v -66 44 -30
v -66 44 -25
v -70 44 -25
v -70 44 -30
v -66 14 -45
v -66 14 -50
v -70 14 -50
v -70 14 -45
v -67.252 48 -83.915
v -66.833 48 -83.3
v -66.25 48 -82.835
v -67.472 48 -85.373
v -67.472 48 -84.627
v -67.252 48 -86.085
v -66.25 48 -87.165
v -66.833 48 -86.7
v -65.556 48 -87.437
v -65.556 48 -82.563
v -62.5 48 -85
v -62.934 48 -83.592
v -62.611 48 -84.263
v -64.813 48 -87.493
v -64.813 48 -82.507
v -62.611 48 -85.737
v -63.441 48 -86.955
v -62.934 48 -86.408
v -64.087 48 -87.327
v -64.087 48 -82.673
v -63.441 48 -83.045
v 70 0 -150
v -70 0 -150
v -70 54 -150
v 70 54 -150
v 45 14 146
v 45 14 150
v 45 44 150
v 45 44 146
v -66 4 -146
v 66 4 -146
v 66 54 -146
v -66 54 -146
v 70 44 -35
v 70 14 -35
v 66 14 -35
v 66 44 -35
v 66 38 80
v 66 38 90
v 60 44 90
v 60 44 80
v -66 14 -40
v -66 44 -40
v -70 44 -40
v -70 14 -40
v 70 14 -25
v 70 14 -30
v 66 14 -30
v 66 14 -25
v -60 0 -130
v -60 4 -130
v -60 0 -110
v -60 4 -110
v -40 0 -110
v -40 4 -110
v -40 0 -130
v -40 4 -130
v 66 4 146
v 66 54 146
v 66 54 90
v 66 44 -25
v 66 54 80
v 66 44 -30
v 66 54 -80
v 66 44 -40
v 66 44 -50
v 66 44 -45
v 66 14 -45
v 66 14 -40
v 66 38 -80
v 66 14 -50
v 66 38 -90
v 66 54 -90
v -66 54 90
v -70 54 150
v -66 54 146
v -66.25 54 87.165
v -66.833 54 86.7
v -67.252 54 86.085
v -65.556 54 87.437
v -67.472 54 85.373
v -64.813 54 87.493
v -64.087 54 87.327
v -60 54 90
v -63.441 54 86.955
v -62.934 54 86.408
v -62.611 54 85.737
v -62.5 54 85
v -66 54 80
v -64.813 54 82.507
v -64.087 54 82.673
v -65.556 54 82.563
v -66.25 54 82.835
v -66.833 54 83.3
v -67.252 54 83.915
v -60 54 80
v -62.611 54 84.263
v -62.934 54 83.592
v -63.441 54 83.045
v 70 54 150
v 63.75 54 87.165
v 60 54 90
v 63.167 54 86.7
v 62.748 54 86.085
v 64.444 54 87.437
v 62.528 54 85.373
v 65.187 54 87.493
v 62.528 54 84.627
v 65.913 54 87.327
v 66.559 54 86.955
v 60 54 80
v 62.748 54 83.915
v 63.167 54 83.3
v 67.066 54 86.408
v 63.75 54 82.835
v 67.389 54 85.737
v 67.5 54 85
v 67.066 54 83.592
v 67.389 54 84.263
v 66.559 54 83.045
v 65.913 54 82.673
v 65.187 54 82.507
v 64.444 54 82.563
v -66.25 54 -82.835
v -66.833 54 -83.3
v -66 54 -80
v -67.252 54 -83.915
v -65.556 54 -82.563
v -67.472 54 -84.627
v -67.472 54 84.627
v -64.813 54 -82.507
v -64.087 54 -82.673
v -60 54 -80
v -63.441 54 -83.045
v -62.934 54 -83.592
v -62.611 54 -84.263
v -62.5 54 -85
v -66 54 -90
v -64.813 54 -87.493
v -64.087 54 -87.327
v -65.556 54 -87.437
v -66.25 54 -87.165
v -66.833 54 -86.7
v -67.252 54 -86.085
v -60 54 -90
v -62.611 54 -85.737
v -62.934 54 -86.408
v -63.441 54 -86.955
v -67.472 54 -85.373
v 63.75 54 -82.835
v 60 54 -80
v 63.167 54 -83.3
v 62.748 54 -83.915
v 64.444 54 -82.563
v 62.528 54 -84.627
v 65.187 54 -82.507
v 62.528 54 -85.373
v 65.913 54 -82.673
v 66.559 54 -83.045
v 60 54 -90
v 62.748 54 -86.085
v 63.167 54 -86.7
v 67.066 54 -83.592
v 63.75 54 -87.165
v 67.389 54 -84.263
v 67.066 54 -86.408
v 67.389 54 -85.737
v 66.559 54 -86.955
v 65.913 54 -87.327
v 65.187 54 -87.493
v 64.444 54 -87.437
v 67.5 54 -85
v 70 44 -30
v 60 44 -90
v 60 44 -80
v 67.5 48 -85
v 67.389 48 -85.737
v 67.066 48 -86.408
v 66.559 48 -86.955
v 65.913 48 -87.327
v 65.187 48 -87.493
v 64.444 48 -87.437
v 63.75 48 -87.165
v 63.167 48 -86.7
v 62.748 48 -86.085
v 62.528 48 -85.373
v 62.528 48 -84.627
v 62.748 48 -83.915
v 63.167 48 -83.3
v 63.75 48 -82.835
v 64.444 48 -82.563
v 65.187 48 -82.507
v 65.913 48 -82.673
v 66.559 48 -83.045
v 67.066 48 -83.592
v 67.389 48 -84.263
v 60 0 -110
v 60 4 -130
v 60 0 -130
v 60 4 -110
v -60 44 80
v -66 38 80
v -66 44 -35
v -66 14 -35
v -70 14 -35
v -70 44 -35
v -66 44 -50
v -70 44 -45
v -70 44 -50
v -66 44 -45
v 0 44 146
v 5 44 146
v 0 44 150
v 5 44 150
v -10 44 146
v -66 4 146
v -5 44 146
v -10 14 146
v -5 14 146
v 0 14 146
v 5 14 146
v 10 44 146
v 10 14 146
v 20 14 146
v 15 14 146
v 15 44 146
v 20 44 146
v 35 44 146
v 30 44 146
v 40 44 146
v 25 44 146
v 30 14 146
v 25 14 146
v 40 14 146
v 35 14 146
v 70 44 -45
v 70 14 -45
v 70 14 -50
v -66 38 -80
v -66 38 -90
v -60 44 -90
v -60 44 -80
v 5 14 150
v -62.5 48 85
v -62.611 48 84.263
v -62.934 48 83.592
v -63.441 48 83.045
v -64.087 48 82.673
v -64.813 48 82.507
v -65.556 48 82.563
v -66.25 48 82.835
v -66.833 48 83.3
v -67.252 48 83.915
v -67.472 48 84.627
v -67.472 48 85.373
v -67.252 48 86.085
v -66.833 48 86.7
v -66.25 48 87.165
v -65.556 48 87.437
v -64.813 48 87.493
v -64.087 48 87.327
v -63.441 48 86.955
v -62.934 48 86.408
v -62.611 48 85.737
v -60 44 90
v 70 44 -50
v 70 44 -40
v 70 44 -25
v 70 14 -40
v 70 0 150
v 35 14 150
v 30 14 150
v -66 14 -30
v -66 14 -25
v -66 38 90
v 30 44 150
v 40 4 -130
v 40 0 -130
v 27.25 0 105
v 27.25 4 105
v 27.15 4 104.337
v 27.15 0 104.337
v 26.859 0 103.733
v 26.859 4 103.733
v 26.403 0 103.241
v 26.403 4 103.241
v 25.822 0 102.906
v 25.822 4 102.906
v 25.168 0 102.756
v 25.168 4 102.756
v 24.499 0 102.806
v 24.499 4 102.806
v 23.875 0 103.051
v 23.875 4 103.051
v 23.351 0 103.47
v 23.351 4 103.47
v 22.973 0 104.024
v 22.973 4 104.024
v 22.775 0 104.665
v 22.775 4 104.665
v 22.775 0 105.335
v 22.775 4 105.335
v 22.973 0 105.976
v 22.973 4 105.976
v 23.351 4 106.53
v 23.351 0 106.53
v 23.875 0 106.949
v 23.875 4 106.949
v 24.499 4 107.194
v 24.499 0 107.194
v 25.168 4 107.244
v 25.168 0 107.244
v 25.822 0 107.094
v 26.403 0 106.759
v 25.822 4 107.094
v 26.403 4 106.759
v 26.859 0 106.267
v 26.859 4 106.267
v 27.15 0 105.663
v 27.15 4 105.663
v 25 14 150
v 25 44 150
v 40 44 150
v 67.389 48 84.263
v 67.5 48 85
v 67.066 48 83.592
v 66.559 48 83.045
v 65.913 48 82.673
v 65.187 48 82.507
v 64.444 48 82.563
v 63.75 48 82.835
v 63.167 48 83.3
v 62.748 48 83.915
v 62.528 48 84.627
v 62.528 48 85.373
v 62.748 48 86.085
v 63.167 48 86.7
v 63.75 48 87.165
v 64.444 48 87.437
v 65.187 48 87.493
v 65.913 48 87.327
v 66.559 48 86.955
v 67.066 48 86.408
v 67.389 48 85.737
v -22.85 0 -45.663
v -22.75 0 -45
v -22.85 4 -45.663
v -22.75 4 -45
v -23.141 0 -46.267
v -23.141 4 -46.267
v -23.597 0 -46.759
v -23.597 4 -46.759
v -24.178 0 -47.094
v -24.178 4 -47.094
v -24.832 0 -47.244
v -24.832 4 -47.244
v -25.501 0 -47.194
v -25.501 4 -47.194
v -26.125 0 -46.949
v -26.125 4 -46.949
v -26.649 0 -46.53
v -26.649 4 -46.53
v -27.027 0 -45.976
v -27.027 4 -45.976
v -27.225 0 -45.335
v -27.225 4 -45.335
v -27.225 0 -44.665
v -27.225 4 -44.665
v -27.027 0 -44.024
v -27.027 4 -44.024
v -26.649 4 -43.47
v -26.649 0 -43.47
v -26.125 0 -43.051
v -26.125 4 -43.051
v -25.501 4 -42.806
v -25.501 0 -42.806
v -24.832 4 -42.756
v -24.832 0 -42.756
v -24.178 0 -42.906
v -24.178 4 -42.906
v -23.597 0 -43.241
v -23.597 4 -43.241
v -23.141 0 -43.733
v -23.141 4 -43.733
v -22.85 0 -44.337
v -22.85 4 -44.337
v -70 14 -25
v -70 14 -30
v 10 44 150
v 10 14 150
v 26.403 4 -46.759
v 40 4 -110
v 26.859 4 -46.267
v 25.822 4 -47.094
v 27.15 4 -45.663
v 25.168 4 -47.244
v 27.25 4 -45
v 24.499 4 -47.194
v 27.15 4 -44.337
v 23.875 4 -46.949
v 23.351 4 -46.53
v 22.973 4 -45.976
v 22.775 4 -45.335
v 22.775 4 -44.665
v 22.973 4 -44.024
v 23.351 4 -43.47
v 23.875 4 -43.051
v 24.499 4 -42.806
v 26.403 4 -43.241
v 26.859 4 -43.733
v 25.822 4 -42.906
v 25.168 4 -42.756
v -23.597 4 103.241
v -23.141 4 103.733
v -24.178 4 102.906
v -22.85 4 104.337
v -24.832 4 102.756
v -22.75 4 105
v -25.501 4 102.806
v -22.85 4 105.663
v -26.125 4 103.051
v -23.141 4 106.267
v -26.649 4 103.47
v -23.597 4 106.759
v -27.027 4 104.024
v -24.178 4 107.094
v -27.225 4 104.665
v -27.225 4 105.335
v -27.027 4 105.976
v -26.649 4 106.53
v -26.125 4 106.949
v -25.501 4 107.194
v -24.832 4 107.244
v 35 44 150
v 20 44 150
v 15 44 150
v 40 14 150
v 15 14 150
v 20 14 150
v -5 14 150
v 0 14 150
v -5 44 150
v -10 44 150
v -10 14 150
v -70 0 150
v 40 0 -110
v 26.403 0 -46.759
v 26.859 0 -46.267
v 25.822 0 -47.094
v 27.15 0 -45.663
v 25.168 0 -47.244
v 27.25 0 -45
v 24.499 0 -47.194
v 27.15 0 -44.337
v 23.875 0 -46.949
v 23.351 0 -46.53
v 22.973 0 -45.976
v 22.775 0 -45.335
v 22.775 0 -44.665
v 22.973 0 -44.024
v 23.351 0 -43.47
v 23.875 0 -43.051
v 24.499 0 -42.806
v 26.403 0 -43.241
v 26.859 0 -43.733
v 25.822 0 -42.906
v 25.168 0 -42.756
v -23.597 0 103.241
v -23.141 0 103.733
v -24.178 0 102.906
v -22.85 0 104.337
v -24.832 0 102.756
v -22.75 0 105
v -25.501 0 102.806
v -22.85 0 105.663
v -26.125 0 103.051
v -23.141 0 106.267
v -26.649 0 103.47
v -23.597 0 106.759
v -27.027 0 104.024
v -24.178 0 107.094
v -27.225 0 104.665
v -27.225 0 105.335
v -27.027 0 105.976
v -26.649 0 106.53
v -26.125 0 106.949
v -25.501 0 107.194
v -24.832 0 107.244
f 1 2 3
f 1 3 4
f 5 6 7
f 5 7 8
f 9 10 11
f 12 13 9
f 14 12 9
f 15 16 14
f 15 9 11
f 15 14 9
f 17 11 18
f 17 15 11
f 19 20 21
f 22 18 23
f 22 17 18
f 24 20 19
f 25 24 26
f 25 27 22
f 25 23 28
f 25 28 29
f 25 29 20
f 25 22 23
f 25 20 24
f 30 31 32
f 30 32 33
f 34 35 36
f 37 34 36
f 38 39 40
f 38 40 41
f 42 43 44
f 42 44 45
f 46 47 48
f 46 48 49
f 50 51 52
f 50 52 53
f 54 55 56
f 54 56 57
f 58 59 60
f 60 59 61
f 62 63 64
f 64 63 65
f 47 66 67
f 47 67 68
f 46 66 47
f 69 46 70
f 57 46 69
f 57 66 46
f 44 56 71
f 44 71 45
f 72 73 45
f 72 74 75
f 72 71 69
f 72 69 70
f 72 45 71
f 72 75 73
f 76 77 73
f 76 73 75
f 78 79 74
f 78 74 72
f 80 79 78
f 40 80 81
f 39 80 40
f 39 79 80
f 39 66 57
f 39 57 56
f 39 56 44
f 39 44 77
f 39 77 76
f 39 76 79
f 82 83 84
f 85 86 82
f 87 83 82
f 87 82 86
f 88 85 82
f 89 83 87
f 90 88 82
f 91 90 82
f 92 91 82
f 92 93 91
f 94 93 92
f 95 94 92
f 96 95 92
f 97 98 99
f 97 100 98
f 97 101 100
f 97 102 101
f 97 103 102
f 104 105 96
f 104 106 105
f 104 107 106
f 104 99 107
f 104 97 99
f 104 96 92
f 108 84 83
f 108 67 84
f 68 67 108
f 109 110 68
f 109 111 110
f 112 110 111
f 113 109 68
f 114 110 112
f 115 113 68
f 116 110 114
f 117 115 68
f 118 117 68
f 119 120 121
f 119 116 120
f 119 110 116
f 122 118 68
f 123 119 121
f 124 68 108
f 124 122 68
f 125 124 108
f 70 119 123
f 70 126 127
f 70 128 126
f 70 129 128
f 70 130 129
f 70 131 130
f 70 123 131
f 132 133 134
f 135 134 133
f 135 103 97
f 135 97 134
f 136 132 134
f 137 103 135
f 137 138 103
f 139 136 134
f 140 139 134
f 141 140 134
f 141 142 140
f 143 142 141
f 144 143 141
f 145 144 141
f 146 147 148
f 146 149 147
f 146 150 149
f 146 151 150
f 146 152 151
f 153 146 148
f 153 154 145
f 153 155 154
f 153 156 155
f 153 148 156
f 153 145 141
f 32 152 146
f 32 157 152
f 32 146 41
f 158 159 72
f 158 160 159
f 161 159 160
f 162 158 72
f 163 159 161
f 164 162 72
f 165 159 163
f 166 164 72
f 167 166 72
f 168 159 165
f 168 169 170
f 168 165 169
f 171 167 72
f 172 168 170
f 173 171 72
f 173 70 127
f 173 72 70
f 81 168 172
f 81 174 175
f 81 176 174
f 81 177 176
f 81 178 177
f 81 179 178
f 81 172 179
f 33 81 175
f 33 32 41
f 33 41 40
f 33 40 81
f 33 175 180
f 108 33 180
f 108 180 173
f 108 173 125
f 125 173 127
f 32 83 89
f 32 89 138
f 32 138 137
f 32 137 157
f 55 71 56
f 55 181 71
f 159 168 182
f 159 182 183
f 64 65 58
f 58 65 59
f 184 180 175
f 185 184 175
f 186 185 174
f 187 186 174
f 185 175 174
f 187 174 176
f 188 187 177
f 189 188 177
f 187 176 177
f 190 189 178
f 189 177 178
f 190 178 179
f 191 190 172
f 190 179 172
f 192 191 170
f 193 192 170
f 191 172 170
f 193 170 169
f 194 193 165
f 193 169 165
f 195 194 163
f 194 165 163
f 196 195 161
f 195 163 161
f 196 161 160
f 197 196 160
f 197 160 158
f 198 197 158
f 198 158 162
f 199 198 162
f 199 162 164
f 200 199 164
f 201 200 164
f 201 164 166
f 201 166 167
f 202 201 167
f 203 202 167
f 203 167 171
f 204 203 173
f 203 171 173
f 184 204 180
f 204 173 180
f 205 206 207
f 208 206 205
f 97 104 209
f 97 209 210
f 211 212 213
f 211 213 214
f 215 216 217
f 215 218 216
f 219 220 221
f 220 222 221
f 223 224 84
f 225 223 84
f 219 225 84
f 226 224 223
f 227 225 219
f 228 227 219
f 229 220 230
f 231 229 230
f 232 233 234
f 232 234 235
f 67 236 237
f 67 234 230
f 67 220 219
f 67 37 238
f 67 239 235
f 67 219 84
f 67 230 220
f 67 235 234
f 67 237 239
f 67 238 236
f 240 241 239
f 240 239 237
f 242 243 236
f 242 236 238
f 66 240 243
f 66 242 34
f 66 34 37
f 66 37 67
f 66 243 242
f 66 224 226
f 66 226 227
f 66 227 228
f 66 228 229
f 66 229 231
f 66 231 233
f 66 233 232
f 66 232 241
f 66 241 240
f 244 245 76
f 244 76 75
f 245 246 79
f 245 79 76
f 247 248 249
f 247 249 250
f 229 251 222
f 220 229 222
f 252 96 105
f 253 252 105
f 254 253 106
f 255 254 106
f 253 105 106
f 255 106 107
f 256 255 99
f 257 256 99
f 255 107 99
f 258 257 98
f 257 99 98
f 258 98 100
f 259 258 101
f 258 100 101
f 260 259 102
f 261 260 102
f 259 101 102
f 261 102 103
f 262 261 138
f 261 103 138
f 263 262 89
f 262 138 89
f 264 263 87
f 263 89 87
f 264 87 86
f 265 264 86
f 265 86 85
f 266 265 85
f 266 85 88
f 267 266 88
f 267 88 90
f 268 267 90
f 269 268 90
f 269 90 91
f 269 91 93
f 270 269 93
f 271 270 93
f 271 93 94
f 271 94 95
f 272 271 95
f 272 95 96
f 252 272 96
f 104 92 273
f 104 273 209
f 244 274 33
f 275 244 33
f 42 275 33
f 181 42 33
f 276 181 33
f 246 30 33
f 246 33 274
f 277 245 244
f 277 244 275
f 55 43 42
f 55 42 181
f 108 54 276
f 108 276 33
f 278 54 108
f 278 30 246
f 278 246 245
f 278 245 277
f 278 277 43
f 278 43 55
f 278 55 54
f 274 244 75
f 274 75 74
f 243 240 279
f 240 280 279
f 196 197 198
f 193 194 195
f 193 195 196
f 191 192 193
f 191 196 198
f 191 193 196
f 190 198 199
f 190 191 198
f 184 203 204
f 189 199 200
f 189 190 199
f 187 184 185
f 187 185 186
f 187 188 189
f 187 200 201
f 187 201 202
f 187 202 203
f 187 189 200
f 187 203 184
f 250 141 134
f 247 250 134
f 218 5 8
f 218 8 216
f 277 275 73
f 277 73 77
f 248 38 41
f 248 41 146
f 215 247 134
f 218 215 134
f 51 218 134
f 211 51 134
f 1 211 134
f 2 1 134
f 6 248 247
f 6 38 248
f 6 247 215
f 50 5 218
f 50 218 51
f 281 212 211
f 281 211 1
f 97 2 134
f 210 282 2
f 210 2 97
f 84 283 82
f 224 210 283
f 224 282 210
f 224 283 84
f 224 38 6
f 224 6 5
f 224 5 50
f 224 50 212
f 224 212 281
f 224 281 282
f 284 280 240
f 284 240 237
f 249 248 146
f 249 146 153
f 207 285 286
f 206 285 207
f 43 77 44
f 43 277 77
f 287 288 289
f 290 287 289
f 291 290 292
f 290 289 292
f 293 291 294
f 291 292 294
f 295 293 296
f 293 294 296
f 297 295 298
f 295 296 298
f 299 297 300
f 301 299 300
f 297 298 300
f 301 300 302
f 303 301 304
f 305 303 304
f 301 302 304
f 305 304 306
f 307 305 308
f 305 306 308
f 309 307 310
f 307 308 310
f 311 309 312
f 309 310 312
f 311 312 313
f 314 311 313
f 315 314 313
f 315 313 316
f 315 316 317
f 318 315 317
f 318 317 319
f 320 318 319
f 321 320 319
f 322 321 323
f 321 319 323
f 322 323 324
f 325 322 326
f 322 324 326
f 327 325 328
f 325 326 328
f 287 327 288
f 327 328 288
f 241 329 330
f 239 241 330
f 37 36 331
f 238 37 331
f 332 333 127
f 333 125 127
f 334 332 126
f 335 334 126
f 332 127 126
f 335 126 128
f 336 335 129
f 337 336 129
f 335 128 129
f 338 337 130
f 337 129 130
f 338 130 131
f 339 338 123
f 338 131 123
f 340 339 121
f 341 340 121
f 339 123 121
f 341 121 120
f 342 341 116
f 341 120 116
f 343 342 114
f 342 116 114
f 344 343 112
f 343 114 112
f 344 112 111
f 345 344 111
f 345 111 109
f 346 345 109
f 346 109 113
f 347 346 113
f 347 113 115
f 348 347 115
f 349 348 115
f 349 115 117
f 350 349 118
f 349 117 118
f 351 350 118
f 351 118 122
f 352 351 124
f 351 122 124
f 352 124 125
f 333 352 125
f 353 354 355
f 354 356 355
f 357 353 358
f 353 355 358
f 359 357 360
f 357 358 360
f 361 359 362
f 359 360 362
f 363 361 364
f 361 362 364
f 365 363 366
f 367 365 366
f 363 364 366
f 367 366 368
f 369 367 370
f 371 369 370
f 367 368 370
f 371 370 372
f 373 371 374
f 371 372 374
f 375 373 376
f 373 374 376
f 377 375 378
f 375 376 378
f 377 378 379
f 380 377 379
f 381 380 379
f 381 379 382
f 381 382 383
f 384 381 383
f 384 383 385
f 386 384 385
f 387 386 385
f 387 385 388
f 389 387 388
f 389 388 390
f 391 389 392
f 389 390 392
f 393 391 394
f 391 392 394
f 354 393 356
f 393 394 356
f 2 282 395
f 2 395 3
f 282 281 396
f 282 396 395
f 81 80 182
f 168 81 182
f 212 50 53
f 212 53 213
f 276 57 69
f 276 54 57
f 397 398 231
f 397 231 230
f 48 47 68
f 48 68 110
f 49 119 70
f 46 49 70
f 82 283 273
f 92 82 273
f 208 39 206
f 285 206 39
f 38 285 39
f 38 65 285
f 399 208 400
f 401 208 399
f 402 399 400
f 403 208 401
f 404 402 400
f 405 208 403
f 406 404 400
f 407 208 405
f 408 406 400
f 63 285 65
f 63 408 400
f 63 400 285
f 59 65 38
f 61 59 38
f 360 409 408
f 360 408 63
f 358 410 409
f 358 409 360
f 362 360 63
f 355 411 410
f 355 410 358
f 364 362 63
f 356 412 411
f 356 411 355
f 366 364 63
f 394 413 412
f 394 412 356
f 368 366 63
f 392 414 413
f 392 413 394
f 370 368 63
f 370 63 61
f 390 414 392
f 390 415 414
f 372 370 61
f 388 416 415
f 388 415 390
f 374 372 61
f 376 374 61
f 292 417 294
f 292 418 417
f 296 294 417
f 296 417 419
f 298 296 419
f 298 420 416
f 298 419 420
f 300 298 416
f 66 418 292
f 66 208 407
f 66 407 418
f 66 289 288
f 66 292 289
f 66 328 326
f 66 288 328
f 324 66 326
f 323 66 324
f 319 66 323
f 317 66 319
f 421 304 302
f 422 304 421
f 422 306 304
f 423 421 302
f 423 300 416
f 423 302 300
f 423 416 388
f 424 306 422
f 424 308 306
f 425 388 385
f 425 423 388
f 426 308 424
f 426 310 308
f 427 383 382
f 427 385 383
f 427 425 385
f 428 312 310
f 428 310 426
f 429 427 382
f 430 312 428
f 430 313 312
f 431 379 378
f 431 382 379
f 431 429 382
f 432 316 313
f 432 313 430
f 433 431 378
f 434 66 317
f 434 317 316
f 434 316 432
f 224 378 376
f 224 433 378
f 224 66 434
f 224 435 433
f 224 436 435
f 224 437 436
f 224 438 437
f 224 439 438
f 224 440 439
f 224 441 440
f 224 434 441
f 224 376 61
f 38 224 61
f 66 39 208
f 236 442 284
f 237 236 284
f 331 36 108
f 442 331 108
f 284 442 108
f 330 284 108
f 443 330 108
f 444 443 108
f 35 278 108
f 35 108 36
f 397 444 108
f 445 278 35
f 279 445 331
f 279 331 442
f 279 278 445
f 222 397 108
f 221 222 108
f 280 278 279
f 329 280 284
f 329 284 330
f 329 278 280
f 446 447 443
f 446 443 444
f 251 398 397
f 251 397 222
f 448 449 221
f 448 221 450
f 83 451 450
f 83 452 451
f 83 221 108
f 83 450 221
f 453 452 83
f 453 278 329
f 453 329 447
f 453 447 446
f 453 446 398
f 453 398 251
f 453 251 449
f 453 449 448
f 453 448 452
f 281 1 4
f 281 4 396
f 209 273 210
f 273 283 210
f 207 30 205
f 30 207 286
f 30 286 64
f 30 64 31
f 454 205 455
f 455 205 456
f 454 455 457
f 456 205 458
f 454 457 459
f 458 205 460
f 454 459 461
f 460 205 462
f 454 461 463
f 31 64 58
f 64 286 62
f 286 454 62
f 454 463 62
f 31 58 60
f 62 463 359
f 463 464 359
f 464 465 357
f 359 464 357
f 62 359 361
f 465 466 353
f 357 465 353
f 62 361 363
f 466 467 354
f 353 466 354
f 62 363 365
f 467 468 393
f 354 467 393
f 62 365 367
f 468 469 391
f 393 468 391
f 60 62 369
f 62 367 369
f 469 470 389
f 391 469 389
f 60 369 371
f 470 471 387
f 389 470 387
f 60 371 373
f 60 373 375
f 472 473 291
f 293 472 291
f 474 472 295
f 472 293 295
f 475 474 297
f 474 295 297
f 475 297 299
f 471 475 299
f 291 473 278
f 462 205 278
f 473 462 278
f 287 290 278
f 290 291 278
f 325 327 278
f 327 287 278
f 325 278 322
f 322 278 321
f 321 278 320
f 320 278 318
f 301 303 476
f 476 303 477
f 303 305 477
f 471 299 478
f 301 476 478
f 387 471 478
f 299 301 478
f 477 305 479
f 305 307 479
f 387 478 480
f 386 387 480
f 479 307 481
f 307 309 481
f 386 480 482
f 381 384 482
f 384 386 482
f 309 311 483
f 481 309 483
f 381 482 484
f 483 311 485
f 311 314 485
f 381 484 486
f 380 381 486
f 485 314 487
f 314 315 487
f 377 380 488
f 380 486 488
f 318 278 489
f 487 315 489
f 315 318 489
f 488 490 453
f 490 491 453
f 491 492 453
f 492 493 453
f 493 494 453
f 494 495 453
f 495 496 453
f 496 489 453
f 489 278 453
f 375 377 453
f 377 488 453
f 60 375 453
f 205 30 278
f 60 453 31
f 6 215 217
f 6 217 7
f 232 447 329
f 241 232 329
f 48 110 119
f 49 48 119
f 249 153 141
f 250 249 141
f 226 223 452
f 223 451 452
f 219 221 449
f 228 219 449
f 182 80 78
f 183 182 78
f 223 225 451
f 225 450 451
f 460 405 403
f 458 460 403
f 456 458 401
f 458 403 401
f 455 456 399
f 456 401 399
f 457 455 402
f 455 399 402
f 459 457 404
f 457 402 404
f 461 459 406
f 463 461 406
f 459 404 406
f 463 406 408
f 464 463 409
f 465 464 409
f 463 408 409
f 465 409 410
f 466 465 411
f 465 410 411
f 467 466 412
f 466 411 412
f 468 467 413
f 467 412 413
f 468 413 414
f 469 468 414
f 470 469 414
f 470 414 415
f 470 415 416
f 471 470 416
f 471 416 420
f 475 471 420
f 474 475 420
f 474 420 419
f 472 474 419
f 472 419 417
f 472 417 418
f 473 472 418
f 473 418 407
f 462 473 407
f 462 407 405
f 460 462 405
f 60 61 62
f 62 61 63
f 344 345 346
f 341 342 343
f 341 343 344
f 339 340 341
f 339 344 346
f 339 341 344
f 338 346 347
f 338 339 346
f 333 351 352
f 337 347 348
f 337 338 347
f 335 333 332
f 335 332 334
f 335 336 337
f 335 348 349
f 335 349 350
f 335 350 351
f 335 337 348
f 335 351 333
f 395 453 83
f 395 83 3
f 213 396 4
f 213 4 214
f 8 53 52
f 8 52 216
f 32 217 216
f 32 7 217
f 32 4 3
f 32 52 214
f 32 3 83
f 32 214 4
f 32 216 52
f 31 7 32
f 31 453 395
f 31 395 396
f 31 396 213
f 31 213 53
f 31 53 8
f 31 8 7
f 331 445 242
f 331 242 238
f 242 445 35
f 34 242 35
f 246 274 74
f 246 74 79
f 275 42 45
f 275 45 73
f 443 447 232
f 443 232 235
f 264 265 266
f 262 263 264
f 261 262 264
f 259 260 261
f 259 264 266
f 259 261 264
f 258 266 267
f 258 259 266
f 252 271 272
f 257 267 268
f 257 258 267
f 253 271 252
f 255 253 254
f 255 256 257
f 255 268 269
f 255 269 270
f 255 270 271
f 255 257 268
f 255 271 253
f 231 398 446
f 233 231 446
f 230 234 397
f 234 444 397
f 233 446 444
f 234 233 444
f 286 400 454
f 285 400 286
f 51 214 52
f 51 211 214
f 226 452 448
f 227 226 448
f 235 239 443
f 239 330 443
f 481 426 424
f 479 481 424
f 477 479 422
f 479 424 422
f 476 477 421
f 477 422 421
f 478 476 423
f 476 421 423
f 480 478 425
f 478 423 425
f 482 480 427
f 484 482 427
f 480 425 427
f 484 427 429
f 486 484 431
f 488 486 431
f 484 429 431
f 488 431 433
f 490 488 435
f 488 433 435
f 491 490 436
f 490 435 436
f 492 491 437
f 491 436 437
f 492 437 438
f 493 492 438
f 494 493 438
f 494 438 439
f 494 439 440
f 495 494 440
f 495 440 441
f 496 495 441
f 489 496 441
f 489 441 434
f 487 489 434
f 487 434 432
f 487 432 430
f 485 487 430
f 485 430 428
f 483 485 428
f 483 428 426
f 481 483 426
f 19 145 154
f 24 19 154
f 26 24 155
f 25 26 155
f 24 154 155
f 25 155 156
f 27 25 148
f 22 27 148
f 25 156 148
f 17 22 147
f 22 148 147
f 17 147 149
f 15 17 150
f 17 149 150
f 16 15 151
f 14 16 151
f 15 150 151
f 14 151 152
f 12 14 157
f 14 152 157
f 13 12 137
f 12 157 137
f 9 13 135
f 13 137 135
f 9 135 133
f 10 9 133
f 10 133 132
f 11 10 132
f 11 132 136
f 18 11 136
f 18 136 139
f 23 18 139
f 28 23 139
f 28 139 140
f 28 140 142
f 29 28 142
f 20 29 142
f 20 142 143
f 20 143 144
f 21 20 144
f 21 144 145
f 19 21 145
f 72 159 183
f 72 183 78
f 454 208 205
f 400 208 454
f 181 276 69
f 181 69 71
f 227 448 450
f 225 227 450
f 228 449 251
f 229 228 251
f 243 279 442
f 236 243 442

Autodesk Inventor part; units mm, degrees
ref_plane "YZ Plane" through (0, 0, 0) normal (1, 0, 0) x (0, 1, 0)
ref_plane "XZ Plane" through (0, 0, 0) normal (0, 1, 0) x (-1, 0, 0)
ref_plane "XY Plane" through (0, 0, 0) normal (0, 0, 1) x (1, 0, 0)
sketch "Sketch1" plane through (0, 0, 0) normal (0, 1, 0) x (-1, 0, 0)
  line L0 (70, -150) -> (-70, -150)
  line L1 (-70, -150) -> (-70, 150)
  line L2 (-70, 150) -> (70, 150)
  line L3 (70, 150) -> (70, -150)
  line L4 (0, -150) -> (0, 150) construction
  line L5 (70, 0) -> (-70, 0) construction
  point P0 (0, 0)
  point P1 (0, 0)
  dimension "d0" = 140
  dimension "d1" = 300
extrude "Extrusion1" add sketch "Sketch1" along normal blind 4
sketch "Sketch2" plane through (0, 4, 0) normal (0, 1, 0) x (1, 0, 0)
  line L0 (-70, -150) -> (70, -150) projected
  line L1 (70, -150) -> (70, 150) projected
  line L2 (-70, -150) -> (70, -150)
  line L3 (70, -150) -> (70, 150)
  line L4 (70, 150) -> (-70, 150)
  line L5 (-70, 150) -> (-70, -150)
  line L6 (-66, -146) -> (66, -146)
  line L7 (66, -146) -> (66, 146)
  line L8 (66, 146) -> (-66, 146)
  line L9 (-66, 146) -> (-66, -146)
  point P0 (0, 0)
  dimension "d4" = 4
  dimension "d5" = 4
  dimension "d6" = 4
  dimension "d7" = 4
extrude "Extrusion2" add sketch "Sketch2" along normal blind 50
sketch "Sketch3" plane through (0, 54, 0) normal (0, 1, 0) x (1, 0, 0)
  line L0 (-70, 150) -> (-70, -150) projected
  line L1 (-70, -90) -> (-60, -90)
  line L2 (-60, -90) -> (-60, -80)
  line L3 (-60, -80) -> (-70, -80)
  line L4 (-70, -80) -> (-70, -90)
  line L5 (-70, -150) -> (70, -150) projected
  line L6 (0, -150) -> (0, 150) construction
  line L7 (-70, 150) -> (70, 150) construction
  line L8 (70, -150) -> (70, 150) construction
  line L9 (70, 0) -> (-70, 0) construction
  line L10 (-70, 90) -> (-60, 90)
  line L11 (-60, 90) -> (-60, 80)
  line L12 (-60, 80) -> (-70, 80)
  line L13 (-70, 80) -> (-70, 90)
  line L14 (70, -90) -> (60, -90)
  line L15 (60, -90) -> (60, -80)
  line L16 (60, -80) -> (70, -80)
  line L17 (70, -80) -> (70, -90)
  line L18 (60, 90) -> (60, 80)
  line L19 (70, 90) -> (60, 90)
  line L20 (70, 80) -> (70, 90)
  line L21 (60, 80) -> (70, 80)
  line L22 (65, 80) -> (65, 90) construction
  line L23 (60, 85) -> (70, 85) construction
  circle A0 centre (65, 85) radius 2.5
  circle A1 centre (-65, 85) radius 2.5
  circle A2 centre (65, -85) radius 2.5
  circle A3 centre (-65, -85) radius 2.5
  point P0 (0, 0)
  dimension "d10" = 10
  dimension "d11" = 10
  dimension "d12" = 60
  dimension "d15" = 5
extrude "Extrusion3" add sketch "Sketch3" against normal blind 16 contours L10 L11 L12 L0 | L3 L2 L1 L0 | L14 L15 L16 L17 | L19 L20 L21 L18 | A0 | A1 | A2 | A3
sketch "Sketch4" plane through (0, 54, 0) normal (0, 1, 0) x (1, 0, 0)
  line L0 (70, -150) -> (-70, -150) construction
  line L1 (0, -150) -> (0, 150) construction
  line L2 (-70, 150) -> (70, 150) construction
  line L3 (70, -150) -> (70, 150) construction
  line L4 (70, 0) -> (-70, 0) construction
  line L5 (-70, -150) -> (-70, 150) construction
  line L6 (60, 90) -> (66, 90) construction
  line L7 (60, 90) -> (70, 90) construction
  line L8 (70, 90) -> (70, 80) construction
  line L9 (70, 80) -> (60, 80) construction
  line L10 (60, 80) -> (60, 90) construction
  line L11 (66, 80) -> (60, 80) construction
  line L12 (65, 90) -> (65, 80) construction
  line L13 (60, 80) -> (60, 90) construction
  line L14 (60, 85) -> (70, 85) construction
  circle A0 centre (65, 85) radius 2.5
  circle A1 centre (-65, 85) radius 2.5
  circle A2 centre (65, -85) radius 2.5
  circle A3 centre (-65, -85) radius 2.5
  point P0 (0, 0)
  dimension "d16" = 5
extrude "Extrusion4" cut sketch "Sketch4" against normal blind 6
chamfer "Chamfer1" distance 6 angle 45 4 edges at (60, 38, -85) (60, 38, 85) (-60, 38, -85) (-60, 38, 85)
sketch "Sketch5" plane through (0, 4, 0) normal (0, 1, 0) x (1, 0, 0)
  line L0 (-70, 150) -> (70, 150) construction
  line L1 (0, 150) -> (0, -150) construction
  line L2 (70, -150) -> (-70, -150) construction
  line L3 (60, 110) -> (40, 110)
  line L4 (40, 110) -> (40, 130)
  line L5 (40, 130) -> (60, 130)
  line L6 (60, 130) -> (60, 110)
  line L7 (50, 110) -> (50, 130) construction
  line L8 (60, 120) -> (40, 120) construction
  line L9 (70, -150) -> (70, 150) construction
  line L10 (-60, 110) -> (-40, 110)
  line L11 (-40, 110) -> (-40, 130)
  line L12 (-40, 130) -> (-60, 130)
  line L13 (-60, 130) -> (-60, 110)
  point P0 (0, 0)
  dimension "d22" = 20
  dimension "d23" = 20
  dimension "d24" = 20
  dimension "d26" = 40
extrude "Extrusion5" cut sketch "Sketch5" against normal up to next
sketch "Sketch6" plane through (0, 4, 0) normal (0, 1, 0) x (1, 0, 0)
  line L0 (-57.5, 77.5) -> (57.5, 77.5) construction
  line L1 (57.5, 77.5) -> (57.5, -137.5) construction
  line L2 (57.5, -137.5) -> (-57.5, -137.5) construction
  line L3 (-57.5, -137.5) -> (-57.5, 77.5) construction
  line L4 (-70, 150) -> (70, 150) projected
  line L5 (0, 150) -> (0, -150) construction
  line L6 (-70, -150) -> (70, -150) projected
  line L7 (0, 77.5) -> (0, -137.5) construction
  line L8 (-25, 45) -> (25, 45) construction
  line L9 (25, 45) -> (25, -105) construction
  line L10 (25, -105) -> (-25, -105) construction
  line L11 (-25, -105) -> (-25, 45) construction
  line L12 (0, 45) -> (0, -105) construction
  circle A0 centre (-25, 45) radius 2.25
  circle A1 centre (25, 45) radius 2.25
  circle A2 centre (-25, -105) radius 2.25
  circle A3 centre (25, -105) radius 2.25
  line L13 (-66, -146) -> (66, -146) projected
  point P0 (0, 0)
  dimension "d29" = 115
  dimension "d30" = 215
  dimension "d31" = 50
  dimension "d32" = 150
  dimension "d33" = 32.5
  dimension "d34" = 4.5
  dimension "d35" = 4.5
  dimension "d36" = 4.5
  dimension "d37" = 4.5
  dimension "d38" = 8.5
extrude "Extrusion6" cut sketch "Sketch6" against normal up to next
sketch "Sketch7" plane through (-70, 0, 150) normal (0, 0, 1) x (1, 0, 0)
  line L0 (70, 44) -> (70, 14)
  line L1 (0, 54) -> (140, 54) projected
  line L2 (140, 0) -> (140, 54) projected
  line L3 (75, 14) -> (75, 44)
  line L4 (80, 14) -> (80, 44)
  line L5 (85, 14) -> (85, 44)
  line L6 (90, 14) -> (90, 44)
  line L7 (95, 14) -> (95, 44)
  line L8 (100, 14) -> (100, 44)
  line L9 (105, 14) -> (105, 44)
  line L10 (110, 14) -> (110, 44)
  line L11 (115, 14) -> (115, 44)
  line L12 (75, 44) -> (70, 44)
  line L13 (85, 44) -> (80, 44)
  line L14 (95, 44) -> (90, 44)
  line L15 (115, 44) -> (110, 44)
  line L16 (105, 44) -> (100, 44)
  line L17 (70, 14) -> (75, 14)
  line L18 (80, 14) -> (85, 14)
  line L19 (90, 14) -> (95, 14)
  line L20 (100, 14) -> (105, 14)
  line L21 (110, 14) -> (115, 14)
  line L22 (60, 44) -> (60, 14)
  line L23 (65, 14) -> (65, 44)
  line L24 (65, 44) -> (60, 44)
  line L25 (60, 14) -> (65, 14)
  point P0 (70, 0)
  dimension "d42" = 30
  dimension "d45" = 5
  dimension "d47" = 5
  dimension "d48" = 5
  dimension "d49" = 5
  dimension "d50" = 5
  dimension "d51" = 5
  dimension "d52" = 5
  dimension "d53" = 5
  dimension "d54" = 10
  dimension "d55" = 25
  dimension "d56" = 5
  dimension "d60" = 30
  dimension "d61" = 5
  dimension "d62" = 5
extrude "Extrusion7" cut sketch "Sketch7" against normal up to next
sketch "Sketch9" plane through (70, 0, 150) normal (1, 0, 0) x (0, 0, -1)
  line L0 (175, 44) -> (180, 44)
  line L1 (180, 44) -> (180, 14)
  line L2 (180, 14) -> (175, 14)
  line L3 (175, 14) -> (175, 44)
  line L4 (0, 54) -> (300, 54) projected
  line L5 (185, 44) -> (190, 44)
  line L6 (190, 44) -> (190, 14)
  line L7 (190, 14) -> (185, 14)
  line L8 (185, 14) -> (185, 44)
  line L9 (195, 44) -> (200, 44)
  line L10 (200, 44) -> (200, 14)
  line L11 (200, 14) -> (195, 14)
  line L12 (195, 14) -> (195, 44)
  line L13 (300, 0) -> (300, 54) projected
  point P0 (150, 0)
  dimension "d63" = 5
  dimension "d64" = 30
  dimension "d65" = 10
  dimension "d68" = 5
  dimension "d69" = 30
  dimension "d70" = 5
  dimension "d71" = 30
  dimension "d72" = 5
  dimension "d73" = 5
  dimension "d74" = 100
extrude "Extrusion8" cut sketch "Sketch9" against normal blind 140
properties part number "power_supply_case"
